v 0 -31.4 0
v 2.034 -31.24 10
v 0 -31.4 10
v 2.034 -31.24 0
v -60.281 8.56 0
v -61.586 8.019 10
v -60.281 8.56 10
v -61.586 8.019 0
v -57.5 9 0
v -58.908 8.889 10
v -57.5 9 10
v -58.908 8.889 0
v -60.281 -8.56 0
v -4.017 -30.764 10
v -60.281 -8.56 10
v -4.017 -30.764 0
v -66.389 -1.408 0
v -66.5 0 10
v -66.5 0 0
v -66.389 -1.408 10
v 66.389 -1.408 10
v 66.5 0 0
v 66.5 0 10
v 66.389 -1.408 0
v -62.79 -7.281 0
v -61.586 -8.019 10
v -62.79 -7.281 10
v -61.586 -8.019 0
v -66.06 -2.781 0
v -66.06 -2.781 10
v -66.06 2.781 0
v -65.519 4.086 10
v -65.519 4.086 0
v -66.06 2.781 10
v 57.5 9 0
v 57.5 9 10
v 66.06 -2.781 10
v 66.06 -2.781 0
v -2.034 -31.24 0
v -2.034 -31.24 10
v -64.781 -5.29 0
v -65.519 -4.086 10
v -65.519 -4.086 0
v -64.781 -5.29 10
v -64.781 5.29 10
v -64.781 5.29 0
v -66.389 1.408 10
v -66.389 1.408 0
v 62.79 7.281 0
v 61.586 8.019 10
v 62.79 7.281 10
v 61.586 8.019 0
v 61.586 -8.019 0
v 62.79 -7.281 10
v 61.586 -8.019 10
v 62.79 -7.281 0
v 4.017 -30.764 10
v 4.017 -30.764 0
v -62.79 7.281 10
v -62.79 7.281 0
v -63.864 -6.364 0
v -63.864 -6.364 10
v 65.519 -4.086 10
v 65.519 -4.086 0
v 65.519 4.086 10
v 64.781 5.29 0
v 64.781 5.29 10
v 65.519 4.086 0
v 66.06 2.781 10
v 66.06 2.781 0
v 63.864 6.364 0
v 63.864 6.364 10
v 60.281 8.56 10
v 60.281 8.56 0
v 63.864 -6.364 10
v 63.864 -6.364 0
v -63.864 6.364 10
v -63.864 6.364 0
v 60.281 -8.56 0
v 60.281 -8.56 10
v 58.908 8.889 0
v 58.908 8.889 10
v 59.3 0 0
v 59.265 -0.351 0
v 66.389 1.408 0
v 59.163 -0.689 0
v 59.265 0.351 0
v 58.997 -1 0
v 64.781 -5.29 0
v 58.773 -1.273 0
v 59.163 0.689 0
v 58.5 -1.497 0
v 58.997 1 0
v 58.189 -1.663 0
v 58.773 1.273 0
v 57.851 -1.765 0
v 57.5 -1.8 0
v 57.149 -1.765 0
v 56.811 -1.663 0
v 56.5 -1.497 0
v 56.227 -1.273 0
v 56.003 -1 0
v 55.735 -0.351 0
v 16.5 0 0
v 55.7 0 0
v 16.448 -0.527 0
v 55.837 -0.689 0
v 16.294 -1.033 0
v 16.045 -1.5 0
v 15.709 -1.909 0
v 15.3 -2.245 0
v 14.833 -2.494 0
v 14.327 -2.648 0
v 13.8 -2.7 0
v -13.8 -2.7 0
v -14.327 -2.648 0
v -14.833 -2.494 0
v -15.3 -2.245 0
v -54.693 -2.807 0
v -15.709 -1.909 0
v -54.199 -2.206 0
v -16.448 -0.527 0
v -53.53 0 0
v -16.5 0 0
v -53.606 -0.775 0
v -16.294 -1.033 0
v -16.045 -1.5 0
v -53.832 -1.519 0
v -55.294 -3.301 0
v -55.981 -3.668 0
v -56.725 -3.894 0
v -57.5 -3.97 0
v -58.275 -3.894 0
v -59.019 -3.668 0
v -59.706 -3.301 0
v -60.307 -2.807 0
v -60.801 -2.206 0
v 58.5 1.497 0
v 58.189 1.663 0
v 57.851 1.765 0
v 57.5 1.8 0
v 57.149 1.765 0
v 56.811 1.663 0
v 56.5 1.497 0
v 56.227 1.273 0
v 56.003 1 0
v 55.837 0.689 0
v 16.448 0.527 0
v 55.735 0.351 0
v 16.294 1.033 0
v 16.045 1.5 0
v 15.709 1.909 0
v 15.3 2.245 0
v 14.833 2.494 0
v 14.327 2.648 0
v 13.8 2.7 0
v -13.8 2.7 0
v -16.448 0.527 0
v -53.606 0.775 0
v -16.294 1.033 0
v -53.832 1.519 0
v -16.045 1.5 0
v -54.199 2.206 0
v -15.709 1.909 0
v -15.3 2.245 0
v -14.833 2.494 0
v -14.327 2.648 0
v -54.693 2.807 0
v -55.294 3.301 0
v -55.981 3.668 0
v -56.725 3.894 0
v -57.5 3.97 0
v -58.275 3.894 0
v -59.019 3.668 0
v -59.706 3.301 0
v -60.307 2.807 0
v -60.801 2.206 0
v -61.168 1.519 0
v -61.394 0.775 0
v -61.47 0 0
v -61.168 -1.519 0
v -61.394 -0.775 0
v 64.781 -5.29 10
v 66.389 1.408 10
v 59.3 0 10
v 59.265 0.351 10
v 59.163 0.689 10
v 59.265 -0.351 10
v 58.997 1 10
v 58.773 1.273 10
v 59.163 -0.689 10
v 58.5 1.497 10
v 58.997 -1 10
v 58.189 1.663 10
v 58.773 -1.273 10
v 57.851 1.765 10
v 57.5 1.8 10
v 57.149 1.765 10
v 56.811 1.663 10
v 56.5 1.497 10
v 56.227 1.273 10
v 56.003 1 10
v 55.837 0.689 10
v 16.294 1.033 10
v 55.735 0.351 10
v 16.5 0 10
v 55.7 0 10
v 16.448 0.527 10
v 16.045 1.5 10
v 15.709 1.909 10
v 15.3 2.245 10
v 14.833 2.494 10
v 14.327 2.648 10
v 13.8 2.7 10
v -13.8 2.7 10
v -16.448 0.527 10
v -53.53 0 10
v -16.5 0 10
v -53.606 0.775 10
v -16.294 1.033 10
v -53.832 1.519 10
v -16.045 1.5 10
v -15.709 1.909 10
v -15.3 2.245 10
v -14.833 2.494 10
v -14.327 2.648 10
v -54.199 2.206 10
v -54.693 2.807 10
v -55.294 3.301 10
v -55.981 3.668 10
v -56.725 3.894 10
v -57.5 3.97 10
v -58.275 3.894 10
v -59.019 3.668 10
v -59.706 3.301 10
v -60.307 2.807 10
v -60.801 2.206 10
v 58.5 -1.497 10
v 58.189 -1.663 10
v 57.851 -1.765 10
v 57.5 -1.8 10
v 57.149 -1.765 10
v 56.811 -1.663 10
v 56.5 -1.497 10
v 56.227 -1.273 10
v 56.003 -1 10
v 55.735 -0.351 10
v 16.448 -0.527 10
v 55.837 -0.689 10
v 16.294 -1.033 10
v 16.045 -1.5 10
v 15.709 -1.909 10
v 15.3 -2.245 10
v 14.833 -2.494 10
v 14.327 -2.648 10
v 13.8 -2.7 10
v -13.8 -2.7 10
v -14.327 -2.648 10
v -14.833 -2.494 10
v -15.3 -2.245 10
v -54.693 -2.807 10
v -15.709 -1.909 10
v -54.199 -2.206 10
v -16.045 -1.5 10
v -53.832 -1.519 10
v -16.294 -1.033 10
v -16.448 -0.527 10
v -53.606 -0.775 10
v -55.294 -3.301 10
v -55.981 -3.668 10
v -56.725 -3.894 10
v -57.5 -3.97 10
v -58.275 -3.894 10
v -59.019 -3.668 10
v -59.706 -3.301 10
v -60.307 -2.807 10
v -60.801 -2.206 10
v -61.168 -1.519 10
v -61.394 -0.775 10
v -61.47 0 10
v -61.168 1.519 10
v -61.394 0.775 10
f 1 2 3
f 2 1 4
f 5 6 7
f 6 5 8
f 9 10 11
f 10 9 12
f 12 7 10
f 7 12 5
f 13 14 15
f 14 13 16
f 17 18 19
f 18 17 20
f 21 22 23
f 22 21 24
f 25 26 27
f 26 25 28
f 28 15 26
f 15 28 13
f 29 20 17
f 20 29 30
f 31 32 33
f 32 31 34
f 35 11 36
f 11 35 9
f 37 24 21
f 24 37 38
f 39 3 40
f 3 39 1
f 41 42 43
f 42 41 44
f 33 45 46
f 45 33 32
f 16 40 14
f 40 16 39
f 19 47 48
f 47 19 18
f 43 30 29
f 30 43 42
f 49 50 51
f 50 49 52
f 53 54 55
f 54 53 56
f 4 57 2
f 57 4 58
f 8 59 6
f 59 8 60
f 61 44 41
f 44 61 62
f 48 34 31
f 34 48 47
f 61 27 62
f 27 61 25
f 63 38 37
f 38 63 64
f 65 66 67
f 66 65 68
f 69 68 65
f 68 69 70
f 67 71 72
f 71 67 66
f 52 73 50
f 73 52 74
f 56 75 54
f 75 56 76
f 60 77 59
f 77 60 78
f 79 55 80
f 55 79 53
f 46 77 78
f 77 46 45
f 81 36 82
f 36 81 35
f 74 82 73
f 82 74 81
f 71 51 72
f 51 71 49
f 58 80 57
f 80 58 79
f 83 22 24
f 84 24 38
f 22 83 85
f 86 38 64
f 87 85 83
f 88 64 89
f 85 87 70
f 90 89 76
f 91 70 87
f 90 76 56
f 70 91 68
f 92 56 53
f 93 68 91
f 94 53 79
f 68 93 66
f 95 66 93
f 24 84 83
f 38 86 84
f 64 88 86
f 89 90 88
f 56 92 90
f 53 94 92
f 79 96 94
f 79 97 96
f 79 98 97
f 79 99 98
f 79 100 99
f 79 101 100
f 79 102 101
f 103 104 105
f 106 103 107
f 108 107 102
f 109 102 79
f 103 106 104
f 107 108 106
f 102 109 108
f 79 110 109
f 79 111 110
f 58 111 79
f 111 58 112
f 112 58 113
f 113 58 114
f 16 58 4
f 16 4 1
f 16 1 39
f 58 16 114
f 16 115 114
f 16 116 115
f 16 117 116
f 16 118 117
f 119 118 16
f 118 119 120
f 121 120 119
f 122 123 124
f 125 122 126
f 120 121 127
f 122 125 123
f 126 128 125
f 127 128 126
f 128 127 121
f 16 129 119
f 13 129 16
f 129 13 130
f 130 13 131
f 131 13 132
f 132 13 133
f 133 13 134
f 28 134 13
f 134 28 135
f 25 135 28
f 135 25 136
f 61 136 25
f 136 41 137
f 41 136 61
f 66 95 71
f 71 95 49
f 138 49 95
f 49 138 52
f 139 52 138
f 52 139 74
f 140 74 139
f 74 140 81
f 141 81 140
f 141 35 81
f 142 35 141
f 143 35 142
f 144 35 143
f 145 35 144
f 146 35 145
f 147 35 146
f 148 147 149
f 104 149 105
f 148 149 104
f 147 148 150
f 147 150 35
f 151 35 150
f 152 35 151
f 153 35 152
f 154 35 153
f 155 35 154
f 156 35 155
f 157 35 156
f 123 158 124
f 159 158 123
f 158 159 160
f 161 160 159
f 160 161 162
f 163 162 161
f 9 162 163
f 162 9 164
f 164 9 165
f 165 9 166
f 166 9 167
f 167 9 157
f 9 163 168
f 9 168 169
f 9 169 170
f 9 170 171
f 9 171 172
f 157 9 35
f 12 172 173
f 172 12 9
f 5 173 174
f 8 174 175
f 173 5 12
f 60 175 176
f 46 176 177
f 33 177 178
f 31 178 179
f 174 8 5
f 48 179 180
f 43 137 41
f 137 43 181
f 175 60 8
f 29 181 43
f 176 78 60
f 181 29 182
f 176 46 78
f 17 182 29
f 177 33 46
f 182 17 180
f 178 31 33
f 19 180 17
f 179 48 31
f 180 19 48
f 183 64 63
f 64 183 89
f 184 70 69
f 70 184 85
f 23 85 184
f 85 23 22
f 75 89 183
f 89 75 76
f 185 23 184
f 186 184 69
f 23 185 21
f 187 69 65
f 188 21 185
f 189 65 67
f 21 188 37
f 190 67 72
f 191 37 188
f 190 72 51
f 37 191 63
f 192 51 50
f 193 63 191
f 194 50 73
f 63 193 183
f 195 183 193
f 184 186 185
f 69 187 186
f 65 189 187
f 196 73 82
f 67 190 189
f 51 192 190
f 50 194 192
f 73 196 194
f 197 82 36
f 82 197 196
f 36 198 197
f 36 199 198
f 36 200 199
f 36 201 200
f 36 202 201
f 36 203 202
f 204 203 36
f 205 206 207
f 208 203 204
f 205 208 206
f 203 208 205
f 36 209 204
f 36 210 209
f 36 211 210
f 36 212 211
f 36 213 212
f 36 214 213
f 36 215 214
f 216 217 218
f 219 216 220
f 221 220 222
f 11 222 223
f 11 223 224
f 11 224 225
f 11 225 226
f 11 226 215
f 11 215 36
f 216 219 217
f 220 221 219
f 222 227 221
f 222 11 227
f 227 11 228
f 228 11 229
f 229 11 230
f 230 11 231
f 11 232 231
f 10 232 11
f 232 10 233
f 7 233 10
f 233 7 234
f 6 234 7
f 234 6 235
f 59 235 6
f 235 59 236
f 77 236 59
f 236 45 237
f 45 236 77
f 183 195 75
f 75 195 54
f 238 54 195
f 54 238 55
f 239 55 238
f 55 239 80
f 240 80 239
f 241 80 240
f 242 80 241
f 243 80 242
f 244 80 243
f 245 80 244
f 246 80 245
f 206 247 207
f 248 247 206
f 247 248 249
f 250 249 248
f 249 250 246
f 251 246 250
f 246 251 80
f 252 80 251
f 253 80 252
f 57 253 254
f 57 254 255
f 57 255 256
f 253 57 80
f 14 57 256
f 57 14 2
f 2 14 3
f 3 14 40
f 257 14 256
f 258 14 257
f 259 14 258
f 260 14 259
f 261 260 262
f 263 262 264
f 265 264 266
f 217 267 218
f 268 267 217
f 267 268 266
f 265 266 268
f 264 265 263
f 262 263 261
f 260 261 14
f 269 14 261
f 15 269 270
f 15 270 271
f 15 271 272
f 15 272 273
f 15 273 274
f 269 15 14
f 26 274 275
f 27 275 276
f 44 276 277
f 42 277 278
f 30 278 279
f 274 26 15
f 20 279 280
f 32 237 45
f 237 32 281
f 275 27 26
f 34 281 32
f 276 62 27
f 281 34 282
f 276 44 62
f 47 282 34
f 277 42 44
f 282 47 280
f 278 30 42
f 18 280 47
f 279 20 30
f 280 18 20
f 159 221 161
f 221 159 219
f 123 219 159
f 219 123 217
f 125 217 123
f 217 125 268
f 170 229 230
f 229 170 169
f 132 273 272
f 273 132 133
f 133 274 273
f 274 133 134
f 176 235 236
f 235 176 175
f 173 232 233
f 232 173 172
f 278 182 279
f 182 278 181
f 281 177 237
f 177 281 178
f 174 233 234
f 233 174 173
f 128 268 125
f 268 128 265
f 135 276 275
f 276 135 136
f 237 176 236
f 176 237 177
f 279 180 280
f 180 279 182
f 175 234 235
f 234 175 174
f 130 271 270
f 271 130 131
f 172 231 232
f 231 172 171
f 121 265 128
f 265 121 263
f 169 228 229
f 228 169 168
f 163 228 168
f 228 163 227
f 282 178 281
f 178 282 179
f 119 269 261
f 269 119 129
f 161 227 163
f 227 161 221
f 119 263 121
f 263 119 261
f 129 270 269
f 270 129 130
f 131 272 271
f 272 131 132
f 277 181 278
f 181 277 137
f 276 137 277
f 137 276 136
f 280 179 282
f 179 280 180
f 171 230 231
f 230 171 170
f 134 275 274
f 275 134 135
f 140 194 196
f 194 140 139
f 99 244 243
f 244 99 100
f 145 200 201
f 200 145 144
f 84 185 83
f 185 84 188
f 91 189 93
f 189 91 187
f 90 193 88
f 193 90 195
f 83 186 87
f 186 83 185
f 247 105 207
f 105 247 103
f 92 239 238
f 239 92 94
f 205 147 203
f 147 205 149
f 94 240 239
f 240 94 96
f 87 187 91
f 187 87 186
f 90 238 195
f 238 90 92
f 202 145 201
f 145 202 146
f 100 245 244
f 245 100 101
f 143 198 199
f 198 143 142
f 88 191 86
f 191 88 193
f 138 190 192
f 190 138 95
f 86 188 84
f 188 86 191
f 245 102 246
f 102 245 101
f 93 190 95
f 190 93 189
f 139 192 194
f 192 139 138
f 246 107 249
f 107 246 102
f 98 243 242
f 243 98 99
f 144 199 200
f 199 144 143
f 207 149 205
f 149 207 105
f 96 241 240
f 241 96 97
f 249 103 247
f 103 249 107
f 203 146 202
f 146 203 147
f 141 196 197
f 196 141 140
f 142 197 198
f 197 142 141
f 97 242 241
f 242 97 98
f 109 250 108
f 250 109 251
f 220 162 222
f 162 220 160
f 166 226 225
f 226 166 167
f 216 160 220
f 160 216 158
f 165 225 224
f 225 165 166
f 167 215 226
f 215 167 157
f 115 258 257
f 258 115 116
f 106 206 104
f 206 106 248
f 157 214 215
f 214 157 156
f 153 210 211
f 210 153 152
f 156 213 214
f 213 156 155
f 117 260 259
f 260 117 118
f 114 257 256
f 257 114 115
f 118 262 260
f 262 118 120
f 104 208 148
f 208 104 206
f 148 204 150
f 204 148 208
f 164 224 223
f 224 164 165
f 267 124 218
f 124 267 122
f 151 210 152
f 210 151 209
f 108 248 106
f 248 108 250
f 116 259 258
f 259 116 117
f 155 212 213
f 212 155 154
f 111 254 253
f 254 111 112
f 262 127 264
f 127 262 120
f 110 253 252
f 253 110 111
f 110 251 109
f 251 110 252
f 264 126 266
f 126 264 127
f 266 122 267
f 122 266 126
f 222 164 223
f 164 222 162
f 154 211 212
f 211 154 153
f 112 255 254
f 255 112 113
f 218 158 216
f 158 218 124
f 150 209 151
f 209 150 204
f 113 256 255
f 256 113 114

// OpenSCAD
$fn = 32;

// ----------------------------------------------------------------------
// Lever: 115 mm between the bosses, 10 mm thick, smooth outline
// ----------------------------------------------------------------------

// --- parameters (mm) ---
lever_l = 115;            // distance between the boss centres
boss_a = 18;              // first boss diameter
boss_b = 18;              // second boss diameter
bore_a = 7.94;            // first bore
bore_b = 3.6;             // second bore
lever_t = 10;             // lever thickness
boss_c = 26;              // middle boss diameter
bend = 18.4;              // how far the middle boss drops
slot_w = 5.4;             // adjustment slot width

lever_profile = [[-66.5, 0], [-66.389, -1.408], [-66.06, -2.781], [-65.519, -4.086], [-64.781, -5.29], [-63.864, -6.364], [-62.79, -7.281], [-61.586, -8.019], [-60.281, -8.56], [-4.017, -30.764], [-2.034, -31.24], [0, -31.4], [2.034, -31.24], [4.017, -30.764], [60.281, -8.56], [61.586, -8.019], [62.79, -7.281], [63.864, -6.364], [64.781, -5.29], [65.519, -4.086], [66.06, -2.781], [66.389, -1.408], [66.5, 0], [66.389, 1.408], [66.06, 2.781], [65.519, 4.086], [64.781, 5.29], [63.864, 6.364], [62.79, 7.281], [61.586, 8.019], [60.281, 8.56], [58.908, 8.889], [57.5, 9], [-57.5, 9], [-58.908, 8.889], [-60.281, 8.56], [-61.586, 8.019], [-62.79, 7.281], [-63.864, 6.364], [-64.781, 5.29], [-65.519, 4.086], [-66.06, 2.781], [-66.389, 1.408]];

difference() {
  linear_extrude(height = lever_t) polygon(lever_profile);
  translate([-57.5, 0, -2.5]) cylinder(h = lever_t + 5, d = bore_a);
  translate([57.5, 0, -2.5]) cylinder(h = lever_t + 5, d = bore_b);
  /* slotted adjustment, stadium shaped */
  hull() {
    translate([-13.8, 0, -2.5]) cylinder(h = lever_t + 5, d = slot_w);
    translate([13.8, 0, -2.5]) cylinder(h = lever_t + 5, d = slot_w);
  }
}
